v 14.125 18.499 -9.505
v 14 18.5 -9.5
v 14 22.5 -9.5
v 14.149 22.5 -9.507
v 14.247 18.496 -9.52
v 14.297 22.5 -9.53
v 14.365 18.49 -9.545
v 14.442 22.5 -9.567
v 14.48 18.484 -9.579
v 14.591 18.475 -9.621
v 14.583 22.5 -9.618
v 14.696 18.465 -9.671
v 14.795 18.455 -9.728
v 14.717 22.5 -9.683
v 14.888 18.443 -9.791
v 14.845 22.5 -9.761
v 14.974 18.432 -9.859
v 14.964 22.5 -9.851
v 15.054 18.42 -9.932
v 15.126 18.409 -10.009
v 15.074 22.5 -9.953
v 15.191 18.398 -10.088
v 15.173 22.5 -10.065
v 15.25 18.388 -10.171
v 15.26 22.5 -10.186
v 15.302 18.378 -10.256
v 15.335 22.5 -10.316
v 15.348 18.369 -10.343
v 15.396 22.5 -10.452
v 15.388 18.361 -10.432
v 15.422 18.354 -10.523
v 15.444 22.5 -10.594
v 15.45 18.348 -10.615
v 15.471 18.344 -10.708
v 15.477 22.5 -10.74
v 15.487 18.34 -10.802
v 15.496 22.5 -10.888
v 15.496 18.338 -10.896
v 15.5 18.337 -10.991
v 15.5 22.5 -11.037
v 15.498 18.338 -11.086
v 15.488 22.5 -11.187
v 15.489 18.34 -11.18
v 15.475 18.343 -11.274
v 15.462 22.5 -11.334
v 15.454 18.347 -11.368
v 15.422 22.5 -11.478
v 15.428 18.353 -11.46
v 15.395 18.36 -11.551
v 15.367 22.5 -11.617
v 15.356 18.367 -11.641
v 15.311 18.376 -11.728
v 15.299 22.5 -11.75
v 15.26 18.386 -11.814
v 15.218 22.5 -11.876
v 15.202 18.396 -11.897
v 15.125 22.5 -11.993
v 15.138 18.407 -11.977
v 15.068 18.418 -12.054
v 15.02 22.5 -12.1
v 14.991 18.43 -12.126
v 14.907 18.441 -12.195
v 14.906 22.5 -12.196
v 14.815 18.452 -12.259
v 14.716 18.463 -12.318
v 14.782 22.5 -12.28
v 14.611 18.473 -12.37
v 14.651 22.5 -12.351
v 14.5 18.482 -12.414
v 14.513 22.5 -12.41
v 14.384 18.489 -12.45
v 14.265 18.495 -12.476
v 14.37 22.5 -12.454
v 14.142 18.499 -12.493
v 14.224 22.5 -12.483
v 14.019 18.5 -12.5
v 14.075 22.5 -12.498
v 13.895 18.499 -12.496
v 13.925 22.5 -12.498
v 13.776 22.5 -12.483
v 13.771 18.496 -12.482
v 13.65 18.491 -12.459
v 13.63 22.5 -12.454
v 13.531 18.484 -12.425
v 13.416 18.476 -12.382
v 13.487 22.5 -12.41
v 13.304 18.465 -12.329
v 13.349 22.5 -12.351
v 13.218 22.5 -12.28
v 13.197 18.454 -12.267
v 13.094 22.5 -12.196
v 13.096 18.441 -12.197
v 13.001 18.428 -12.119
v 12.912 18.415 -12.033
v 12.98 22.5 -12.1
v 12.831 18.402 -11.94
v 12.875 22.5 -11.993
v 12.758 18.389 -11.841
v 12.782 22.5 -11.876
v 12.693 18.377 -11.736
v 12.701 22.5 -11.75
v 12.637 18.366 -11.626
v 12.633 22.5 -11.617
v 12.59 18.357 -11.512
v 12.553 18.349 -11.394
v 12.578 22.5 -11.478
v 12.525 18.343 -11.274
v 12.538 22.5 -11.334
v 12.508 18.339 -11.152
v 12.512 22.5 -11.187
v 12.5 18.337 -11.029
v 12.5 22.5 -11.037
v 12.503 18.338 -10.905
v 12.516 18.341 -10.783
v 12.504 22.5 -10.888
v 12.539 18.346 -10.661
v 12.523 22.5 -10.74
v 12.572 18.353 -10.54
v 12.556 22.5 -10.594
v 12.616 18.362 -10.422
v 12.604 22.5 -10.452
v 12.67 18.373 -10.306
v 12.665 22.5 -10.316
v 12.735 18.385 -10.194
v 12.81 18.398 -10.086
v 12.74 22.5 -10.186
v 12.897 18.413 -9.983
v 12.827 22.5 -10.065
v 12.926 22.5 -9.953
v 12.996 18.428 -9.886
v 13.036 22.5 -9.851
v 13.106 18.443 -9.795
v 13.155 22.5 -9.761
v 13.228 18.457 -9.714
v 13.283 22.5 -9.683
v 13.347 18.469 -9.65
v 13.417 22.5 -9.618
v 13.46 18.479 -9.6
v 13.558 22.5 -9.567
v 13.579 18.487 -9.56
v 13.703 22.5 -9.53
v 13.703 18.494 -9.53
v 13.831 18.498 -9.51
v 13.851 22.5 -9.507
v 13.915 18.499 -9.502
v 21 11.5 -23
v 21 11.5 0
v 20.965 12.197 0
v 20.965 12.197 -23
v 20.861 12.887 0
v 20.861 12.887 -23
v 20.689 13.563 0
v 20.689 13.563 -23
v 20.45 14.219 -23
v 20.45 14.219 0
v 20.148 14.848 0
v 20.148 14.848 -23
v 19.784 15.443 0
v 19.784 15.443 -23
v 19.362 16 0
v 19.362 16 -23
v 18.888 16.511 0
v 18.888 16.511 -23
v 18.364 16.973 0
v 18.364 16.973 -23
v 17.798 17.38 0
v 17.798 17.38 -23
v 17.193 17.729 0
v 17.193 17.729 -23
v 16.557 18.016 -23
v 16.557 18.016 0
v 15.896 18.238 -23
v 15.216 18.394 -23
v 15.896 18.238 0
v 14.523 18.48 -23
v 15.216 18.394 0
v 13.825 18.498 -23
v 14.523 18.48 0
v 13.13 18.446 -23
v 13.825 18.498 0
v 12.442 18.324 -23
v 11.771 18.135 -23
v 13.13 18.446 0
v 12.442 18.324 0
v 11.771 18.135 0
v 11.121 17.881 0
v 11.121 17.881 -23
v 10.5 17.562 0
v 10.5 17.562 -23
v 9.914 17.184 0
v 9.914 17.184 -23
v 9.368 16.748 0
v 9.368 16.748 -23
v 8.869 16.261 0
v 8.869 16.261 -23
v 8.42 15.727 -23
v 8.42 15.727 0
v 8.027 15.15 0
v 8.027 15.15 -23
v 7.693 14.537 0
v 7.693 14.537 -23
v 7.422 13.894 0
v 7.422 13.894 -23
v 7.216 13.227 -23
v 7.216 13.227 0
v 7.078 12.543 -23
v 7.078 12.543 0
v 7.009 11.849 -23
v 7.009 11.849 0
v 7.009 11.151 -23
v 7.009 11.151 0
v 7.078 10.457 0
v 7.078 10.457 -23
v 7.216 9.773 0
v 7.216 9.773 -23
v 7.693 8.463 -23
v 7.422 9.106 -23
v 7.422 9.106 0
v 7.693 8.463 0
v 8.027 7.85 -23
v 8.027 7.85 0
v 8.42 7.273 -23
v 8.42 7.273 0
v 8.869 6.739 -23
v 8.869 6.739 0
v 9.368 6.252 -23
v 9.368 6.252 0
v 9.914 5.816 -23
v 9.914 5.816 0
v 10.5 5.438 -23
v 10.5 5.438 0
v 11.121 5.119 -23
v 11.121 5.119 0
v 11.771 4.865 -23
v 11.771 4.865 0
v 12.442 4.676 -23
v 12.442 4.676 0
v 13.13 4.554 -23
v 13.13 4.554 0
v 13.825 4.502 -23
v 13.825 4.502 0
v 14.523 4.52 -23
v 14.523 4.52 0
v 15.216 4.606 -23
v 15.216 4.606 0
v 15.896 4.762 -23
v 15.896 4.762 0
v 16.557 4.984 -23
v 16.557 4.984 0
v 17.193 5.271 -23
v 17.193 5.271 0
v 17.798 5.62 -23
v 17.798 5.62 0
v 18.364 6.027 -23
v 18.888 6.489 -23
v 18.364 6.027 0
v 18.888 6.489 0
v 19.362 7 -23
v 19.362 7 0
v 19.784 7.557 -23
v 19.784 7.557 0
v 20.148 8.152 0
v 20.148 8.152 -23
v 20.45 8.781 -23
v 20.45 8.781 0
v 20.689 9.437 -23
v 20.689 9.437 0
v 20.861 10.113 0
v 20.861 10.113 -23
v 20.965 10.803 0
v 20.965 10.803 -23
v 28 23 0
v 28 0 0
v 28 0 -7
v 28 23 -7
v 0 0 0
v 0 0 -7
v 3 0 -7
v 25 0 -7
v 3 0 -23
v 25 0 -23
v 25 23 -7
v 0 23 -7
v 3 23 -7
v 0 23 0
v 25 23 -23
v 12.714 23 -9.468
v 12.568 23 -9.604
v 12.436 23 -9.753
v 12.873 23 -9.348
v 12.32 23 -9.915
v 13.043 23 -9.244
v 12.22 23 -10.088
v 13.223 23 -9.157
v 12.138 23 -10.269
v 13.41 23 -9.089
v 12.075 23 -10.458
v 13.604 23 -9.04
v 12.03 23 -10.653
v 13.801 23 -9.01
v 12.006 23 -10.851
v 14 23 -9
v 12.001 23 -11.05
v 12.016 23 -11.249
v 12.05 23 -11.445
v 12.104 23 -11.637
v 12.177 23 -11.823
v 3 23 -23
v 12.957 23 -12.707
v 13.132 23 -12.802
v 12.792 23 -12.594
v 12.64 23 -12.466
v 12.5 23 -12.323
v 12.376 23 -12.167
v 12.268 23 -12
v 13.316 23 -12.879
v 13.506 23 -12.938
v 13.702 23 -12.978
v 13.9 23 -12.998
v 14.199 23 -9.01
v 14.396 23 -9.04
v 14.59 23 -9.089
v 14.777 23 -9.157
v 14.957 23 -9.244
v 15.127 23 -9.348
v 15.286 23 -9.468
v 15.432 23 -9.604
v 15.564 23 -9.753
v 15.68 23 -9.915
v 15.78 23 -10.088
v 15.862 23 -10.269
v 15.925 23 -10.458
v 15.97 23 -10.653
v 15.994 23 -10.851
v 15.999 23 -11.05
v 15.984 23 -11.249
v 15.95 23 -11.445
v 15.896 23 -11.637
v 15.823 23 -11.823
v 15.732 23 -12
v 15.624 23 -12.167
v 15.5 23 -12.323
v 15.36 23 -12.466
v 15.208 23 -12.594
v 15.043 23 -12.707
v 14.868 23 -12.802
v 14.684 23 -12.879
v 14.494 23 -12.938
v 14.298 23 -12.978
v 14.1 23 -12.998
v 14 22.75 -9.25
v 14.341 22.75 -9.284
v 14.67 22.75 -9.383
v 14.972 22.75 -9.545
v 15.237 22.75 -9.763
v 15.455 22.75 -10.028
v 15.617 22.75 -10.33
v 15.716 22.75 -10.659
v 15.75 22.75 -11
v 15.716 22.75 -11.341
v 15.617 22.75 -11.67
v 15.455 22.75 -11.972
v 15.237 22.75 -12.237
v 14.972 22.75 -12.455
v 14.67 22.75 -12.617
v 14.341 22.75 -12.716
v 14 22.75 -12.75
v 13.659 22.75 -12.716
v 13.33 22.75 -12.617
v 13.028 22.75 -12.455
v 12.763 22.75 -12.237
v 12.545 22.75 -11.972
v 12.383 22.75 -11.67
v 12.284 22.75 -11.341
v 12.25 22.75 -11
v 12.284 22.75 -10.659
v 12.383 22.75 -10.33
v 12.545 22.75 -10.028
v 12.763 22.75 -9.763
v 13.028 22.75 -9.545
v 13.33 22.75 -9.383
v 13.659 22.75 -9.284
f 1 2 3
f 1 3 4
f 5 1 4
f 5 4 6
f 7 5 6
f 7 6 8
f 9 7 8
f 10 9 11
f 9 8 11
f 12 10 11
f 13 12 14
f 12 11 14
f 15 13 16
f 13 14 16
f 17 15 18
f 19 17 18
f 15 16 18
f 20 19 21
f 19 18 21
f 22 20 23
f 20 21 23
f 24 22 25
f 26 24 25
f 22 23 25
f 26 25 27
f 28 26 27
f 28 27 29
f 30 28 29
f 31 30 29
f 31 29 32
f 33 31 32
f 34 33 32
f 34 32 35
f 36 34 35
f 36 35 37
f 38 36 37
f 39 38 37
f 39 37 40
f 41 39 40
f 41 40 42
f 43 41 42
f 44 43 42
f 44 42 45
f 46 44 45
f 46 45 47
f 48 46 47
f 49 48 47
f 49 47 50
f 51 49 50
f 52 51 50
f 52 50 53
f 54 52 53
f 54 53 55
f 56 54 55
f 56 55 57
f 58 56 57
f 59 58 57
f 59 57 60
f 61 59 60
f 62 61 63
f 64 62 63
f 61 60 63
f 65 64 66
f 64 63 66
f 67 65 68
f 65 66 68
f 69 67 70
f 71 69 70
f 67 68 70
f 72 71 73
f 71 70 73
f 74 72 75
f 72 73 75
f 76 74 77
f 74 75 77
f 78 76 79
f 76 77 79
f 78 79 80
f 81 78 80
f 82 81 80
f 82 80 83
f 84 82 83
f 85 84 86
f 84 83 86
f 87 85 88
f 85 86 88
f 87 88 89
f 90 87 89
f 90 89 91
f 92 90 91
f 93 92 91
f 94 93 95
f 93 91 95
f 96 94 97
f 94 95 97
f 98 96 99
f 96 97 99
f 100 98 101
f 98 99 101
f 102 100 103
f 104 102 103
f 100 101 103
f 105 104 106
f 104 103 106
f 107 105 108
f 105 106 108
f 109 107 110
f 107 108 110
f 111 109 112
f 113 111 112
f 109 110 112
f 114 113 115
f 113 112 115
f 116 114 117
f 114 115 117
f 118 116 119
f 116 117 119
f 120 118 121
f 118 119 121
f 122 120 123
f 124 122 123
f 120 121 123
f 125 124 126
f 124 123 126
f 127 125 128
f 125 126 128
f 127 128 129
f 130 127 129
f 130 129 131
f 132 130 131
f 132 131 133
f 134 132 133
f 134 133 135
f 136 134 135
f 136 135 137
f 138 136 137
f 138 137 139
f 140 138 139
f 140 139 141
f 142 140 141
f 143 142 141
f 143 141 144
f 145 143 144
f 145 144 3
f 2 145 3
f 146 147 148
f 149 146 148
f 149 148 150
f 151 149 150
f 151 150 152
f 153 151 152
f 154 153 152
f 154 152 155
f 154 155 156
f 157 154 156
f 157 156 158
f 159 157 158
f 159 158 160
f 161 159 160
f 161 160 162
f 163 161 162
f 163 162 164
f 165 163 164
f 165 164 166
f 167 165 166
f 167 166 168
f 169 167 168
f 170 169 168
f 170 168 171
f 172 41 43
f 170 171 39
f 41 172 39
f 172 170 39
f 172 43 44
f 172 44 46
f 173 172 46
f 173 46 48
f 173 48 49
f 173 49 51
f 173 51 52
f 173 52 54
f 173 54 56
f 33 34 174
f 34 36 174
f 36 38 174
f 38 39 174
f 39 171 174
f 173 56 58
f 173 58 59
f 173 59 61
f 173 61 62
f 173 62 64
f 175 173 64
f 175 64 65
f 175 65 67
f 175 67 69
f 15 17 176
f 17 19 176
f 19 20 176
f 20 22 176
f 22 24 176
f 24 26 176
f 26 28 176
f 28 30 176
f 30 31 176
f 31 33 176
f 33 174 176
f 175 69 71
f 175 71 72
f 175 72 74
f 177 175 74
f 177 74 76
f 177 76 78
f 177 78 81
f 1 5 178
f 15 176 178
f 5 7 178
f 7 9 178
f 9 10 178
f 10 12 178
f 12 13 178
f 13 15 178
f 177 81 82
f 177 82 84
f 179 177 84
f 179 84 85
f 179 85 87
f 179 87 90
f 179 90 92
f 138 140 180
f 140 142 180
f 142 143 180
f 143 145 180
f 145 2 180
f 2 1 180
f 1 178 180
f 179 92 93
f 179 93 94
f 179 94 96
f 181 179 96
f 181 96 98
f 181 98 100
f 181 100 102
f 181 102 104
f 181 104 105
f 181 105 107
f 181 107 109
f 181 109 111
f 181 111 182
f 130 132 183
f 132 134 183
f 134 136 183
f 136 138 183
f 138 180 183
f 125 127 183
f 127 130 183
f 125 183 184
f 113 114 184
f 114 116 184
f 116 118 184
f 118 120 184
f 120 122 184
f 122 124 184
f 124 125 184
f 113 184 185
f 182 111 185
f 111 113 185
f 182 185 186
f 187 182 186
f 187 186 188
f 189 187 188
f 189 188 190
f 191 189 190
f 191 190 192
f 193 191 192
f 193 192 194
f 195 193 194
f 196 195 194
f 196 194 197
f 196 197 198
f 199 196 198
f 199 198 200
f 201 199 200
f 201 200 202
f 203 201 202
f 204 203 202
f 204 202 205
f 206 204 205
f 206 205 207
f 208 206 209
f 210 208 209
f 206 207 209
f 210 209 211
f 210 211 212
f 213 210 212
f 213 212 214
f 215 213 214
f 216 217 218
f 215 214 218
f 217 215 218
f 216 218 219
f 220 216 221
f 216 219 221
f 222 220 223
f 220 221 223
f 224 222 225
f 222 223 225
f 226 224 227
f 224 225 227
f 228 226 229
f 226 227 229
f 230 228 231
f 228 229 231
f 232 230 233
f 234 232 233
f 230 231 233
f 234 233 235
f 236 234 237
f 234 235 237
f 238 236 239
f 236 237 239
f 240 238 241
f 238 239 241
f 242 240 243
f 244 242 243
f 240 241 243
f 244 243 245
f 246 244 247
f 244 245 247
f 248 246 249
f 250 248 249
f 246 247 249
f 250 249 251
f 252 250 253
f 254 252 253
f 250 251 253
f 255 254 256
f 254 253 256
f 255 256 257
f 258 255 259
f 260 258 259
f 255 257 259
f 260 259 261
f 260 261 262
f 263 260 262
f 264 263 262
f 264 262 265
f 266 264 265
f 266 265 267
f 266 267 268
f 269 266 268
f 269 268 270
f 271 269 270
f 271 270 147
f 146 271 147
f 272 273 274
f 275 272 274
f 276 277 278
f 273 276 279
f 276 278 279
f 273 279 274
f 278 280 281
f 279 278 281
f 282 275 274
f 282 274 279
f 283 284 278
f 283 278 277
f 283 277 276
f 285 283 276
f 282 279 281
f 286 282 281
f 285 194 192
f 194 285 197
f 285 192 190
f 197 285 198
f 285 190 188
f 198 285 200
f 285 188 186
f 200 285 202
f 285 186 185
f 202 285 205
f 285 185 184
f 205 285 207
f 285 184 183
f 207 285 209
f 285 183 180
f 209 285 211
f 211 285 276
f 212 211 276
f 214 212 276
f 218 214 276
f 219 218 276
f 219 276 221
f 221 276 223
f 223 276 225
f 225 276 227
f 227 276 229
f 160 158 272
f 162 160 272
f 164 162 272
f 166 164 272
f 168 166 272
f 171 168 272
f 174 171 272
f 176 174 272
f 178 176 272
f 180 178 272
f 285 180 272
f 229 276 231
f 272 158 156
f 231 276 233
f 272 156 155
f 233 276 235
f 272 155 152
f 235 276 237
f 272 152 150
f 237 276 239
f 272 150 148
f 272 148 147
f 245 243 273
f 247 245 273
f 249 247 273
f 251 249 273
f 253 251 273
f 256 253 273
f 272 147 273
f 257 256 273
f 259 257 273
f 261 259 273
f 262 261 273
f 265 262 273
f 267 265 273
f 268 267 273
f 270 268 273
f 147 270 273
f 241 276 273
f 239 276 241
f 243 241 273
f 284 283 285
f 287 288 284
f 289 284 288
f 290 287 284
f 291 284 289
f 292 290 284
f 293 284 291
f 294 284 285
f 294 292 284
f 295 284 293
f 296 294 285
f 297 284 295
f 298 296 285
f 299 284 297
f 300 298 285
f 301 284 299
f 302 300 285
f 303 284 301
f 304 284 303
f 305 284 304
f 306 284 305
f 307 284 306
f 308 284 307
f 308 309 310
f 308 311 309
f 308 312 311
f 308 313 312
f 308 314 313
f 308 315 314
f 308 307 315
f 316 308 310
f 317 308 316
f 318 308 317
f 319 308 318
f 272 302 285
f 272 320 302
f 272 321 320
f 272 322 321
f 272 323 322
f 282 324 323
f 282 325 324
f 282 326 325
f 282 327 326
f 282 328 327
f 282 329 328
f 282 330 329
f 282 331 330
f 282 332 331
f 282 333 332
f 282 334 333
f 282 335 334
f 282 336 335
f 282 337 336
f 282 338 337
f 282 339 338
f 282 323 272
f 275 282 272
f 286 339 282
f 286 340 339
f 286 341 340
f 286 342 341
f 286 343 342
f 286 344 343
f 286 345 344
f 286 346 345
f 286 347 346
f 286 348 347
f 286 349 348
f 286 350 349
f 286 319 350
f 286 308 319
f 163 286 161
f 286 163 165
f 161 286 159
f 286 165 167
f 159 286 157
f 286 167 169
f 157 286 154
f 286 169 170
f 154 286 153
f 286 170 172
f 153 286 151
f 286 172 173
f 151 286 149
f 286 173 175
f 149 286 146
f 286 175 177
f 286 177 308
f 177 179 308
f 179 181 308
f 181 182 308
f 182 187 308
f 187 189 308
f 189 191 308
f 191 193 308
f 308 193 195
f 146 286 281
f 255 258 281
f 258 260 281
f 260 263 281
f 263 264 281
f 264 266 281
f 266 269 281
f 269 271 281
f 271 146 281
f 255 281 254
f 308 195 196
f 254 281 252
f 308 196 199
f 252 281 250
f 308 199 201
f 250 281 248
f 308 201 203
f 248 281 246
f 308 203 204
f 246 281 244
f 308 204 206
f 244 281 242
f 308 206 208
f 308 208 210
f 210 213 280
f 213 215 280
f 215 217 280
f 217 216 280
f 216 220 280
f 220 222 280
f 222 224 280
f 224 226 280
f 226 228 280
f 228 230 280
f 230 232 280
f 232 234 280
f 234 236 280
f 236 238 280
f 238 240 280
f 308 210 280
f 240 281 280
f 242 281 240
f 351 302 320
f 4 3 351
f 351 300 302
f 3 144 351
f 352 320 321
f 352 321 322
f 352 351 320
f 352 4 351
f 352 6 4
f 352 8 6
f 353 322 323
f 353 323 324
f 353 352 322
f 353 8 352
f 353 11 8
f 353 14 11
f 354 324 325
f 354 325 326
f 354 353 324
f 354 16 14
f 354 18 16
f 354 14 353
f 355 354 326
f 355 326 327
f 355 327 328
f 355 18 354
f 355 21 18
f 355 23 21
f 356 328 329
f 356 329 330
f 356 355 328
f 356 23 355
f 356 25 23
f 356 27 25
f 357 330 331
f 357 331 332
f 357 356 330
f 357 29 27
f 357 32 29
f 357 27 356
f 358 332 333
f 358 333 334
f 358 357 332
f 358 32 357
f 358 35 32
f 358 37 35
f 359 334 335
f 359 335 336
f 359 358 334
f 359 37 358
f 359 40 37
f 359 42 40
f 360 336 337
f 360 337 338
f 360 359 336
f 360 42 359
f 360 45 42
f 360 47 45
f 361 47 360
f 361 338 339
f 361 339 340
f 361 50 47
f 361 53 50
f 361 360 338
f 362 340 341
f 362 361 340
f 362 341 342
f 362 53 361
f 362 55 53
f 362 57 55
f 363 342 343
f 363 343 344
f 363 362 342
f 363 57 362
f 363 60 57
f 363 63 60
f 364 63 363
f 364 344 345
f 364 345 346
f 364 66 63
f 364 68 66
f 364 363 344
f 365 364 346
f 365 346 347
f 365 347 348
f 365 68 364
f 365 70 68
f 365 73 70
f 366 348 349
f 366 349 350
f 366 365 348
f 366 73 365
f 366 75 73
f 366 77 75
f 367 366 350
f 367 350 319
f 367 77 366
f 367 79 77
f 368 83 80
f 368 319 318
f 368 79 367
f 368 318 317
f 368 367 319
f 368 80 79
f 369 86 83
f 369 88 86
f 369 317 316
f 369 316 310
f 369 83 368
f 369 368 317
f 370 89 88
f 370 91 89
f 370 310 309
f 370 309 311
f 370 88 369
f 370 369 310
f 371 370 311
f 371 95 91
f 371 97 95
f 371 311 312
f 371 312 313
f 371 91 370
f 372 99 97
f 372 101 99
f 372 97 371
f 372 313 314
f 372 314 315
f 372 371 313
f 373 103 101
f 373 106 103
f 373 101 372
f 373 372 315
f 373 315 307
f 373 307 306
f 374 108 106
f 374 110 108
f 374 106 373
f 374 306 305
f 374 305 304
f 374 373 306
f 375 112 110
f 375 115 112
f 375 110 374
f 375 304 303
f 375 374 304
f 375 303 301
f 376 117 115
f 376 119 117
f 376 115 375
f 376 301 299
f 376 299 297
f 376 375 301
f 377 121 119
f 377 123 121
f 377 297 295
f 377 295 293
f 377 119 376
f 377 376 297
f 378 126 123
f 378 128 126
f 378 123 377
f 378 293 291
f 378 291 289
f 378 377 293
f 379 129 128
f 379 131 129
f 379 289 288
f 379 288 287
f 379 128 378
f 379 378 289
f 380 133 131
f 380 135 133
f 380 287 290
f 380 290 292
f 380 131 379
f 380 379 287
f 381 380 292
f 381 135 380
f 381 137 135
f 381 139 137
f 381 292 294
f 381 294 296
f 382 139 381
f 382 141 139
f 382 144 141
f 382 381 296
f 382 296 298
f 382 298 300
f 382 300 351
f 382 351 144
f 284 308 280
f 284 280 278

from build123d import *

# Parameters (mm, degrees)
BOSS_EXTRUDE1_DEPTH = 23
SKETCH2_R           = 7
CUT_EXTRUDE1_DEPTH  = 43.918527468
SKETCH3_R           = 1.5
CUT_EXTRUDE2_DEPTH  = 10
CHAMFER1_SIZE       = 0.5


with BuildPart() as part:
    # Sketch1 → Boss-Extrude1 (new body)
    with BuildSketch(Plane(origin=(0, 0, 0), x_dir=(1, 0, 0), z_dir=(0, 1, 0))):
        Polygon((0, 0), (28, 0), (28, 7), (25, 7), (25, 23), (3, 23), (3, 7), (0, 7), align=None)
    extrude(amount=BOSS_EXTRUDE1_DEPTH)

    # Sketch2 → Cut-Extrude1 (cut, through all)
    with BuildSketch(Plane.XY):
        with Locations((14, 11.5)):
            Circle(SKETCH2_R)
    extrude(amount=-CUT_EXTRUDE1_DEPTH, mode=Mode.SUBTRACT)

    # Sketch3 → Cut-Extrude2 (cut)
    with BuildSketch(Plane(origin=(0, 23, 0), x_dir=(1, 0, 0), z_dir=(0, 1, 0))):
        with Locations(Location((14, 11, 0), (0, 0, 270))):
            Circle(SKETCH3_R)
    extrude(amount=-CUT_EXTRUDE2_DEPTH, mode=Mode.SUBTRACT)

    # Chamfer1
    chamfer1_edges = [part.edges().sort_by_distance(p)[0] for p in [
        (14, 23, -12.5),
    ]]
    chamfer(chamfer1_edges, length=CHAMFER1_SIZE)


solid = part.part
